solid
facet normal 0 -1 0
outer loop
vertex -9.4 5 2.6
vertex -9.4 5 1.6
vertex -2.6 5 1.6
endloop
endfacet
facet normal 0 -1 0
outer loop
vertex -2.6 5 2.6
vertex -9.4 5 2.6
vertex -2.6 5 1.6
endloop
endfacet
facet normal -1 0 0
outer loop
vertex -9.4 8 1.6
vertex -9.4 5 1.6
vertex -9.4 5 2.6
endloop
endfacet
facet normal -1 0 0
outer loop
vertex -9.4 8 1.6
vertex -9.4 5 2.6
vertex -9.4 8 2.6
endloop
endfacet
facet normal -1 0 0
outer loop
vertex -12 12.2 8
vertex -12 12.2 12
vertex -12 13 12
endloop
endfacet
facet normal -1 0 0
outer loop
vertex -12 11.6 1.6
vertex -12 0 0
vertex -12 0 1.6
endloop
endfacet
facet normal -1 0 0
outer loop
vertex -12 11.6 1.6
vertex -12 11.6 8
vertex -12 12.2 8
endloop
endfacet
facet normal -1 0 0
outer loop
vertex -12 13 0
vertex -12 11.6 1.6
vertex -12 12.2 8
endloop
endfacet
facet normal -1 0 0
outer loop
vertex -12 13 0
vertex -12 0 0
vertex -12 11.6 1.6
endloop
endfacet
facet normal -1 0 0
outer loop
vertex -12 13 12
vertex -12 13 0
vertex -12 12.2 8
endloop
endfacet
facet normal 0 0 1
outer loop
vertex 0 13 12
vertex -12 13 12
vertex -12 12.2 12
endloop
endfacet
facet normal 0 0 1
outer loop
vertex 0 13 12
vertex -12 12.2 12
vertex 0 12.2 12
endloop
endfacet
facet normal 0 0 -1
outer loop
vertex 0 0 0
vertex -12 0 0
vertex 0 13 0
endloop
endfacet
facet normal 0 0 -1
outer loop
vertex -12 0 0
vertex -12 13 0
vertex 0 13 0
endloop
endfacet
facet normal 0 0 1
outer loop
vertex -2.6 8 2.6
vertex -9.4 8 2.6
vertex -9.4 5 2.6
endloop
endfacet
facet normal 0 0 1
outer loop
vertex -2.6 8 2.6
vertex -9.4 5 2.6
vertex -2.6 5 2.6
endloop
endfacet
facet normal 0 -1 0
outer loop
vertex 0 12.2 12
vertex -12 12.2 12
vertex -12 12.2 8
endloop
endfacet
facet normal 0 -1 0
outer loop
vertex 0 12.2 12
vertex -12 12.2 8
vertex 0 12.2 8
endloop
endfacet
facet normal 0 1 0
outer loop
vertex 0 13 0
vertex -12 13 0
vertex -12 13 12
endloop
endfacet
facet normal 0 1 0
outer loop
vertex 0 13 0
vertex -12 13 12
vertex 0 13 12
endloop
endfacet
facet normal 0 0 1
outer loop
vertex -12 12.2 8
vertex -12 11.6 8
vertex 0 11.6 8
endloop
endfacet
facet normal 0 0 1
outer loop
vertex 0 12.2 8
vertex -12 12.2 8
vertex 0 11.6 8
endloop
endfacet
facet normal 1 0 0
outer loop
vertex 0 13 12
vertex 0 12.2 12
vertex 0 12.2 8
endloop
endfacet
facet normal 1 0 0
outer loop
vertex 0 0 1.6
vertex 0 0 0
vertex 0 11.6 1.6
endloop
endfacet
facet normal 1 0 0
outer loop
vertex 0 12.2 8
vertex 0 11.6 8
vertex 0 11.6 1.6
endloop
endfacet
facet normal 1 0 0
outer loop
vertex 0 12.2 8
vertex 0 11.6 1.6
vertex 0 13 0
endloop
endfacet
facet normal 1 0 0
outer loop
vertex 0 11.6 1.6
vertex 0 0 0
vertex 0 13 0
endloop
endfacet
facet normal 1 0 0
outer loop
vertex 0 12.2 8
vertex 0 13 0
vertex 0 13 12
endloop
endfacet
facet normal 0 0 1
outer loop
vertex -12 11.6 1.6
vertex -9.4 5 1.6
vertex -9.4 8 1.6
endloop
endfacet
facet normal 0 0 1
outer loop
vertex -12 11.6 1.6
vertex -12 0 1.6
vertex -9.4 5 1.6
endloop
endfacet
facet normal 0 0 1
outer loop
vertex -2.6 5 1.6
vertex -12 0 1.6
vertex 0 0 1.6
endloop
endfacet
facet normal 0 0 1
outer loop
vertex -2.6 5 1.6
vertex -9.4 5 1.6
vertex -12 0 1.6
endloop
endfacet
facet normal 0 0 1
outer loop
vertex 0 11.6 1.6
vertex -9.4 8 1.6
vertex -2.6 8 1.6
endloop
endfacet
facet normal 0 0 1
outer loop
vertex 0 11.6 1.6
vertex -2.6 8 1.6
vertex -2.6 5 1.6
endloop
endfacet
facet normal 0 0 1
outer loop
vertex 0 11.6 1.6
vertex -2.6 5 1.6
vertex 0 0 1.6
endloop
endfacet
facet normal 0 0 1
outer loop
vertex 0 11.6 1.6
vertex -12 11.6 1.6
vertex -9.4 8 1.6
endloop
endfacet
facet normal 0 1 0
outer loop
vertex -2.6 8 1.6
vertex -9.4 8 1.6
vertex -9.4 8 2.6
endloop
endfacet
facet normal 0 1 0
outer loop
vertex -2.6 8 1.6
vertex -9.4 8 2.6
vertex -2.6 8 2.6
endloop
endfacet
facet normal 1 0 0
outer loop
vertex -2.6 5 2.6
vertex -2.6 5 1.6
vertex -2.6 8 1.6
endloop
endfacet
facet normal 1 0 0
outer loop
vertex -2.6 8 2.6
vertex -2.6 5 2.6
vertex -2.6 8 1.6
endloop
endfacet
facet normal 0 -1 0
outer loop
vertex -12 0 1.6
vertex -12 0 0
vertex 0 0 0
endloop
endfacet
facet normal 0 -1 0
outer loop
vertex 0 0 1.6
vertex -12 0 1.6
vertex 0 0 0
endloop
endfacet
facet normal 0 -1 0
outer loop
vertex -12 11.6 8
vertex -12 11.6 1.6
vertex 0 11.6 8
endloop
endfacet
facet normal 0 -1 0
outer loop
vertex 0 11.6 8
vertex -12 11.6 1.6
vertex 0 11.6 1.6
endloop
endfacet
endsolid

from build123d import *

# Parameters (mm, degrees)
F0_W     = 12
F0_H     = 1.4
F1_DEPTH = 12
F0_H_2   = 11.6
F0_W_2   = 6.8
F0_H_3   = 3
F2_DEPTH = 1.6
F3_DEPTH = 2.6
F4_W     = 12
F4_H     = 4
F5_DEPTH = 0.6


with BuildPart() as f1:
    # F0 (on Top) → F1 (new body)
    with BuildSketch(Plane.XY):
        with Locations((-6, 12.3)):
            Rectangle(F0_W, F0_H)
    extrude(amount=F1_DEPTH)

    # F0 (on Top) → F2 (join)
    with BuildSketch(Plane.XY):
        with Locations((-6, 5.8)):
            Rectangle(F0_W, F0_H_2)
        with Locations((-6, 6.5)):
            Rectangle(F0_W_2, F0_H_3, mode=Mode.SUBTRACT)
    extrude(amount=F2_DEPTH)

    # F0 (on Top) → F3 (join)
    with BuildSketch(Plane.XY):
        with Locations((-6, 6.5)):
            Rectangle(F0_W_2, F0_H_3)
    extrude(amount=F3_DEPTH)

    # F4 (on face) → F5 (cut)
    with BuildSketch(Plane.XZ.offset(-11.6)):
        with Locations((-6, 10)):
            Rectangle(F4_W, F4_H)
    extrude(amount=-F5_DEPTH, mode=Mode.SUBTRACT)


solid = f1.part
